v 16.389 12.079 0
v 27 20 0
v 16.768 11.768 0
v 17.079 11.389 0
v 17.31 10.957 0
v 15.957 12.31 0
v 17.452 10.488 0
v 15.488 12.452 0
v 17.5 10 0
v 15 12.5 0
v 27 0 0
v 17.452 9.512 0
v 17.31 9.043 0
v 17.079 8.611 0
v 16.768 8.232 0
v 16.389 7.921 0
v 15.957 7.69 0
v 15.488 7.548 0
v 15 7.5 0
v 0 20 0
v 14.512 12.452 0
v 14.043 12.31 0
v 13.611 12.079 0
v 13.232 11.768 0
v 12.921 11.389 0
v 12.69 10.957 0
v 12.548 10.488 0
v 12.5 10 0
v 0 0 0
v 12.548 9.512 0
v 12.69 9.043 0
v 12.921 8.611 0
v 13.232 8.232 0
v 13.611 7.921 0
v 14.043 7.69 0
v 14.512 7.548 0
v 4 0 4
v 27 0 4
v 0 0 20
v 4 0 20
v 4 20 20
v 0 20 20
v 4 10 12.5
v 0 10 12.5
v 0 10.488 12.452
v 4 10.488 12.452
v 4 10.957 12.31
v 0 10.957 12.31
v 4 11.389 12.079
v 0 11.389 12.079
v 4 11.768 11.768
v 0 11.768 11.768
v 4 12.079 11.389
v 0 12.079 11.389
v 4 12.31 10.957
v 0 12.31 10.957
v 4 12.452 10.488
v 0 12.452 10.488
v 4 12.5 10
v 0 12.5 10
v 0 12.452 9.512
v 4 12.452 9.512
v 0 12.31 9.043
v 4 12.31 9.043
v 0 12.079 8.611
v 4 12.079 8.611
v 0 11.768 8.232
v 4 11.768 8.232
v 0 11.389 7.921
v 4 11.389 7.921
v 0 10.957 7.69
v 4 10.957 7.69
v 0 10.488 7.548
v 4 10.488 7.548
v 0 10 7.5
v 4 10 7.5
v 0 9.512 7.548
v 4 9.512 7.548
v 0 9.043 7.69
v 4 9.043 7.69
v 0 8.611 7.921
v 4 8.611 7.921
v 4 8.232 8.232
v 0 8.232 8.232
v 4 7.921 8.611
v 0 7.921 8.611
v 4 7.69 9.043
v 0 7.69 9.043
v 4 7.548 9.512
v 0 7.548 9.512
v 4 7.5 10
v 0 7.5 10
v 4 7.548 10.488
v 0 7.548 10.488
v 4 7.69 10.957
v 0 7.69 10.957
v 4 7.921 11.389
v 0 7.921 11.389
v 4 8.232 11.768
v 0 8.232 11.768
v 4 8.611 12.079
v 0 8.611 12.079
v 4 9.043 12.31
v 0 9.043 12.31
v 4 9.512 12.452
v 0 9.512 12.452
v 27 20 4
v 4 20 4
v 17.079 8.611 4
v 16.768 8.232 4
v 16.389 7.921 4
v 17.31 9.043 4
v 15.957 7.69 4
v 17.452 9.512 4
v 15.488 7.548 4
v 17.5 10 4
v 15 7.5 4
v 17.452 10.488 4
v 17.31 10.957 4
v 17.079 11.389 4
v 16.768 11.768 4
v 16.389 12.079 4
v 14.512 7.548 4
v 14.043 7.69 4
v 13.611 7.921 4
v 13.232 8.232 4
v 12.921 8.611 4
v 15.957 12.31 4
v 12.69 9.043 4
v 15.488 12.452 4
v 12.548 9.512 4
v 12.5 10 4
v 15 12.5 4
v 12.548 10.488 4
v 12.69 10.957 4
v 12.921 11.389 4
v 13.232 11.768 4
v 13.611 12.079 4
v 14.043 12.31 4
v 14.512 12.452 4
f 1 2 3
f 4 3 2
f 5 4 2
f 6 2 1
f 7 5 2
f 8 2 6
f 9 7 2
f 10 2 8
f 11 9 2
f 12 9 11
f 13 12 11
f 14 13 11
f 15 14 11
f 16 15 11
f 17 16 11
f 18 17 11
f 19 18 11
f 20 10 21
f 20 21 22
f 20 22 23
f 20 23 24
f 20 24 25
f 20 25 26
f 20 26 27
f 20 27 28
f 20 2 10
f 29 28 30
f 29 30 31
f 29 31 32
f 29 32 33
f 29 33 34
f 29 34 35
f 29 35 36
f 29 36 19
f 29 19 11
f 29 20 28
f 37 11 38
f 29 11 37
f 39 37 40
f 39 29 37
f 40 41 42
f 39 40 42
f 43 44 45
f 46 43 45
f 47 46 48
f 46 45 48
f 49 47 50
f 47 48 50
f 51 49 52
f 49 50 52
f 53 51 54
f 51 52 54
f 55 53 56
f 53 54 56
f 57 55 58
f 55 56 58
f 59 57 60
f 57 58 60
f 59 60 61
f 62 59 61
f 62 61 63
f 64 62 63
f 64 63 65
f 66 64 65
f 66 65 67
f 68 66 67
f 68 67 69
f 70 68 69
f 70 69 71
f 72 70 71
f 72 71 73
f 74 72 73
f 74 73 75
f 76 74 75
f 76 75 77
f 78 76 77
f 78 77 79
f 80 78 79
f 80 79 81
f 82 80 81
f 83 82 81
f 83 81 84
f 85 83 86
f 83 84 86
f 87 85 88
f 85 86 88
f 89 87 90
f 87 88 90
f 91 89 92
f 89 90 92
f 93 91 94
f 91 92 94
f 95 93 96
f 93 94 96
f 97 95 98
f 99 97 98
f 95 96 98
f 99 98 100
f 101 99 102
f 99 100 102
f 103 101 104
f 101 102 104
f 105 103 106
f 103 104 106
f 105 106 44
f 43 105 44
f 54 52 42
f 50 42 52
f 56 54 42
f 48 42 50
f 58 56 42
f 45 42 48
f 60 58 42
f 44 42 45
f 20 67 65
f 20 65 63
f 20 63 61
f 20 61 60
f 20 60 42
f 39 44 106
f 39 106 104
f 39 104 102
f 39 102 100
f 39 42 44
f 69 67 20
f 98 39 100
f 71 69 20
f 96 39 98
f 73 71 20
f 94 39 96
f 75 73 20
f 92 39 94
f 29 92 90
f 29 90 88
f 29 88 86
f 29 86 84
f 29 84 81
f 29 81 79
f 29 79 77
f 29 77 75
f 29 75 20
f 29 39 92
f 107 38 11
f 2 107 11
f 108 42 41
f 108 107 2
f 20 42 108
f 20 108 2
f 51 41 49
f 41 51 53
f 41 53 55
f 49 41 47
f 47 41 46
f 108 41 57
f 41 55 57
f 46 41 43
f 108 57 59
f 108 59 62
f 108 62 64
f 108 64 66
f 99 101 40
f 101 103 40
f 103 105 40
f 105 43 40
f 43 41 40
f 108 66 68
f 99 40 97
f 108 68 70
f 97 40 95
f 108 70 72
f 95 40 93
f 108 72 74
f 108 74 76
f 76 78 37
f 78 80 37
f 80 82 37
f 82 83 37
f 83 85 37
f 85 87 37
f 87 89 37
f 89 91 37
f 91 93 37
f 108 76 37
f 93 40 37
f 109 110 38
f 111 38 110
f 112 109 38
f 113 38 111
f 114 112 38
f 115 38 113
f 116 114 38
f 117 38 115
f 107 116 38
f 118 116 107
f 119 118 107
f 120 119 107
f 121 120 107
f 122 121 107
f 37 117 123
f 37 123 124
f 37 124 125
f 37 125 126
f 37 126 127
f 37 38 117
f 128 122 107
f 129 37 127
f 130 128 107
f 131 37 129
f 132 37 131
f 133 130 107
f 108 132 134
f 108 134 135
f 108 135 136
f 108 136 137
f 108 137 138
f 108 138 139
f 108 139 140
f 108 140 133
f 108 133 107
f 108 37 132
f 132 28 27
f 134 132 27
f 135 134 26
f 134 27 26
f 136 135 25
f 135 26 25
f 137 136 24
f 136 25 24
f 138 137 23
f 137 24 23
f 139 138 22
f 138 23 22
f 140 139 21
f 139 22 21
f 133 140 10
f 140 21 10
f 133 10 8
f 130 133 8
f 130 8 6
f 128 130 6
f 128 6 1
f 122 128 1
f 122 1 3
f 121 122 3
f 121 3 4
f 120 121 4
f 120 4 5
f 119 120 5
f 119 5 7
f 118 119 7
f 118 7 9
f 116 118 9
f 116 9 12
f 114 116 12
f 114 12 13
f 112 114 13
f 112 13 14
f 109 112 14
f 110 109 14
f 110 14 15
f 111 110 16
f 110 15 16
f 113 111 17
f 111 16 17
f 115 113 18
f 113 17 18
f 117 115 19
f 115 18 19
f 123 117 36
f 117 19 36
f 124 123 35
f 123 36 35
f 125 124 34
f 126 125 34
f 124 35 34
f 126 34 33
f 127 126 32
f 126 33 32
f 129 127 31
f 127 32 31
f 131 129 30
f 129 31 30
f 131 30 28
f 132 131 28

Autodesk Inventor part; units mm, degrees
ref_plane "YZ Plane" through (0, 0, 0) normal (1, 0, 0) x (0, 1, 0)
ref_plane "XZ Plane" through (0, 0, 0) normal (0, 1, 0) x (-1, 0, 0)
ref_plane "XY Plane" through (0, 0, 0) normal (0, 0, 1) x (1, 0, 0)
sketch "Sketch1" plane through (0, 0, 0) normal (0, 1, 0) x (-1, 0, 0)
  line L0 (0, 0) -> (-20, 0)
  line L1 (-20, 0) -> (-20, 20)
  line L2 (-20, 20) -> (0, 20)
  line L3 (0, 20) -> (0, 0)
  line L4 (-20, 20) -> (-4, 20)
  line L5 (-4, 20) -> (-4, 4)
  line L6 (-4, 4) -> (-20, 4)
  line L7 (-20, 4) -> (-20, 20)
  dimension "d0" = 20
  dimension "d1" = 20
  dimension "d2" = 16
  dimension "d3" = 16
extrude "Extrusion1" add sketch "Sketch1" along normal blind 20 contours L0 L1 L6 L5 L2 L3
sketch "Sketch2" plane through (0, 0, 0) normal (-1, 0, 0) x (0, 0, 1)
  line L0 (0, 0) -> (10, 0)
  line L1 (10, 0) -> (10, 10)
  line L2 (10, 10) -> (0, 10)
  line L3 (0, 10) -> (0, 0)
  circle A0 centre (10, 10) radius 2.5
  dimension "d6" = 10
  dimension "d7" = 10
  dimension "d8" = 5
extrude "Extrusion2" cut sketch "Sketch2" against normal blind 20 contours A0 L2 L1 | L1 L2 A0
sketch "Sketch3" plane through (20, 0, 0) normal (0, 0, -1) x (-1, 0, 0)
  line L0 (16, 0) -> (0, 0) projected
  line L1 (0, 0) -> (5, 0)
  line L2 (5, 0) -> (5, 10)
  line L3 (5, 10) -> (0, 10)
  line L4 (0, 10) -> (0, 0)
  circle A0 centre (5, 10) radius 2.5
  point P0 (20, 0)
  dimension "d11" = 5
  dimension "d12" = 10
  dimension "d13" = 5
extrude "Extrusion3" cut sketch "Sketch3" against normal blind 20 contours A0 L3 L2 | L2 L3 A0
sketch "Sketch4" plane through (20, 0, 4) normal (1, 0, 0) x (0, 0, -1)
  line L0 (4, 0) -> (-16, 0) projected
  line L1 (0, 0) -> (0, 20) projected
  line L2 (4, 0) -> (0, 0)
  line L3 (0, 0) -> (0, 20)
  line L4 (0, 20) -> (4, 20)
  line L5 (4, 20) -> (4, 0)
extrude "Extrusion4" add sketch "Sketch4" along normal blind 7
properties part number "l-holder_2020"
